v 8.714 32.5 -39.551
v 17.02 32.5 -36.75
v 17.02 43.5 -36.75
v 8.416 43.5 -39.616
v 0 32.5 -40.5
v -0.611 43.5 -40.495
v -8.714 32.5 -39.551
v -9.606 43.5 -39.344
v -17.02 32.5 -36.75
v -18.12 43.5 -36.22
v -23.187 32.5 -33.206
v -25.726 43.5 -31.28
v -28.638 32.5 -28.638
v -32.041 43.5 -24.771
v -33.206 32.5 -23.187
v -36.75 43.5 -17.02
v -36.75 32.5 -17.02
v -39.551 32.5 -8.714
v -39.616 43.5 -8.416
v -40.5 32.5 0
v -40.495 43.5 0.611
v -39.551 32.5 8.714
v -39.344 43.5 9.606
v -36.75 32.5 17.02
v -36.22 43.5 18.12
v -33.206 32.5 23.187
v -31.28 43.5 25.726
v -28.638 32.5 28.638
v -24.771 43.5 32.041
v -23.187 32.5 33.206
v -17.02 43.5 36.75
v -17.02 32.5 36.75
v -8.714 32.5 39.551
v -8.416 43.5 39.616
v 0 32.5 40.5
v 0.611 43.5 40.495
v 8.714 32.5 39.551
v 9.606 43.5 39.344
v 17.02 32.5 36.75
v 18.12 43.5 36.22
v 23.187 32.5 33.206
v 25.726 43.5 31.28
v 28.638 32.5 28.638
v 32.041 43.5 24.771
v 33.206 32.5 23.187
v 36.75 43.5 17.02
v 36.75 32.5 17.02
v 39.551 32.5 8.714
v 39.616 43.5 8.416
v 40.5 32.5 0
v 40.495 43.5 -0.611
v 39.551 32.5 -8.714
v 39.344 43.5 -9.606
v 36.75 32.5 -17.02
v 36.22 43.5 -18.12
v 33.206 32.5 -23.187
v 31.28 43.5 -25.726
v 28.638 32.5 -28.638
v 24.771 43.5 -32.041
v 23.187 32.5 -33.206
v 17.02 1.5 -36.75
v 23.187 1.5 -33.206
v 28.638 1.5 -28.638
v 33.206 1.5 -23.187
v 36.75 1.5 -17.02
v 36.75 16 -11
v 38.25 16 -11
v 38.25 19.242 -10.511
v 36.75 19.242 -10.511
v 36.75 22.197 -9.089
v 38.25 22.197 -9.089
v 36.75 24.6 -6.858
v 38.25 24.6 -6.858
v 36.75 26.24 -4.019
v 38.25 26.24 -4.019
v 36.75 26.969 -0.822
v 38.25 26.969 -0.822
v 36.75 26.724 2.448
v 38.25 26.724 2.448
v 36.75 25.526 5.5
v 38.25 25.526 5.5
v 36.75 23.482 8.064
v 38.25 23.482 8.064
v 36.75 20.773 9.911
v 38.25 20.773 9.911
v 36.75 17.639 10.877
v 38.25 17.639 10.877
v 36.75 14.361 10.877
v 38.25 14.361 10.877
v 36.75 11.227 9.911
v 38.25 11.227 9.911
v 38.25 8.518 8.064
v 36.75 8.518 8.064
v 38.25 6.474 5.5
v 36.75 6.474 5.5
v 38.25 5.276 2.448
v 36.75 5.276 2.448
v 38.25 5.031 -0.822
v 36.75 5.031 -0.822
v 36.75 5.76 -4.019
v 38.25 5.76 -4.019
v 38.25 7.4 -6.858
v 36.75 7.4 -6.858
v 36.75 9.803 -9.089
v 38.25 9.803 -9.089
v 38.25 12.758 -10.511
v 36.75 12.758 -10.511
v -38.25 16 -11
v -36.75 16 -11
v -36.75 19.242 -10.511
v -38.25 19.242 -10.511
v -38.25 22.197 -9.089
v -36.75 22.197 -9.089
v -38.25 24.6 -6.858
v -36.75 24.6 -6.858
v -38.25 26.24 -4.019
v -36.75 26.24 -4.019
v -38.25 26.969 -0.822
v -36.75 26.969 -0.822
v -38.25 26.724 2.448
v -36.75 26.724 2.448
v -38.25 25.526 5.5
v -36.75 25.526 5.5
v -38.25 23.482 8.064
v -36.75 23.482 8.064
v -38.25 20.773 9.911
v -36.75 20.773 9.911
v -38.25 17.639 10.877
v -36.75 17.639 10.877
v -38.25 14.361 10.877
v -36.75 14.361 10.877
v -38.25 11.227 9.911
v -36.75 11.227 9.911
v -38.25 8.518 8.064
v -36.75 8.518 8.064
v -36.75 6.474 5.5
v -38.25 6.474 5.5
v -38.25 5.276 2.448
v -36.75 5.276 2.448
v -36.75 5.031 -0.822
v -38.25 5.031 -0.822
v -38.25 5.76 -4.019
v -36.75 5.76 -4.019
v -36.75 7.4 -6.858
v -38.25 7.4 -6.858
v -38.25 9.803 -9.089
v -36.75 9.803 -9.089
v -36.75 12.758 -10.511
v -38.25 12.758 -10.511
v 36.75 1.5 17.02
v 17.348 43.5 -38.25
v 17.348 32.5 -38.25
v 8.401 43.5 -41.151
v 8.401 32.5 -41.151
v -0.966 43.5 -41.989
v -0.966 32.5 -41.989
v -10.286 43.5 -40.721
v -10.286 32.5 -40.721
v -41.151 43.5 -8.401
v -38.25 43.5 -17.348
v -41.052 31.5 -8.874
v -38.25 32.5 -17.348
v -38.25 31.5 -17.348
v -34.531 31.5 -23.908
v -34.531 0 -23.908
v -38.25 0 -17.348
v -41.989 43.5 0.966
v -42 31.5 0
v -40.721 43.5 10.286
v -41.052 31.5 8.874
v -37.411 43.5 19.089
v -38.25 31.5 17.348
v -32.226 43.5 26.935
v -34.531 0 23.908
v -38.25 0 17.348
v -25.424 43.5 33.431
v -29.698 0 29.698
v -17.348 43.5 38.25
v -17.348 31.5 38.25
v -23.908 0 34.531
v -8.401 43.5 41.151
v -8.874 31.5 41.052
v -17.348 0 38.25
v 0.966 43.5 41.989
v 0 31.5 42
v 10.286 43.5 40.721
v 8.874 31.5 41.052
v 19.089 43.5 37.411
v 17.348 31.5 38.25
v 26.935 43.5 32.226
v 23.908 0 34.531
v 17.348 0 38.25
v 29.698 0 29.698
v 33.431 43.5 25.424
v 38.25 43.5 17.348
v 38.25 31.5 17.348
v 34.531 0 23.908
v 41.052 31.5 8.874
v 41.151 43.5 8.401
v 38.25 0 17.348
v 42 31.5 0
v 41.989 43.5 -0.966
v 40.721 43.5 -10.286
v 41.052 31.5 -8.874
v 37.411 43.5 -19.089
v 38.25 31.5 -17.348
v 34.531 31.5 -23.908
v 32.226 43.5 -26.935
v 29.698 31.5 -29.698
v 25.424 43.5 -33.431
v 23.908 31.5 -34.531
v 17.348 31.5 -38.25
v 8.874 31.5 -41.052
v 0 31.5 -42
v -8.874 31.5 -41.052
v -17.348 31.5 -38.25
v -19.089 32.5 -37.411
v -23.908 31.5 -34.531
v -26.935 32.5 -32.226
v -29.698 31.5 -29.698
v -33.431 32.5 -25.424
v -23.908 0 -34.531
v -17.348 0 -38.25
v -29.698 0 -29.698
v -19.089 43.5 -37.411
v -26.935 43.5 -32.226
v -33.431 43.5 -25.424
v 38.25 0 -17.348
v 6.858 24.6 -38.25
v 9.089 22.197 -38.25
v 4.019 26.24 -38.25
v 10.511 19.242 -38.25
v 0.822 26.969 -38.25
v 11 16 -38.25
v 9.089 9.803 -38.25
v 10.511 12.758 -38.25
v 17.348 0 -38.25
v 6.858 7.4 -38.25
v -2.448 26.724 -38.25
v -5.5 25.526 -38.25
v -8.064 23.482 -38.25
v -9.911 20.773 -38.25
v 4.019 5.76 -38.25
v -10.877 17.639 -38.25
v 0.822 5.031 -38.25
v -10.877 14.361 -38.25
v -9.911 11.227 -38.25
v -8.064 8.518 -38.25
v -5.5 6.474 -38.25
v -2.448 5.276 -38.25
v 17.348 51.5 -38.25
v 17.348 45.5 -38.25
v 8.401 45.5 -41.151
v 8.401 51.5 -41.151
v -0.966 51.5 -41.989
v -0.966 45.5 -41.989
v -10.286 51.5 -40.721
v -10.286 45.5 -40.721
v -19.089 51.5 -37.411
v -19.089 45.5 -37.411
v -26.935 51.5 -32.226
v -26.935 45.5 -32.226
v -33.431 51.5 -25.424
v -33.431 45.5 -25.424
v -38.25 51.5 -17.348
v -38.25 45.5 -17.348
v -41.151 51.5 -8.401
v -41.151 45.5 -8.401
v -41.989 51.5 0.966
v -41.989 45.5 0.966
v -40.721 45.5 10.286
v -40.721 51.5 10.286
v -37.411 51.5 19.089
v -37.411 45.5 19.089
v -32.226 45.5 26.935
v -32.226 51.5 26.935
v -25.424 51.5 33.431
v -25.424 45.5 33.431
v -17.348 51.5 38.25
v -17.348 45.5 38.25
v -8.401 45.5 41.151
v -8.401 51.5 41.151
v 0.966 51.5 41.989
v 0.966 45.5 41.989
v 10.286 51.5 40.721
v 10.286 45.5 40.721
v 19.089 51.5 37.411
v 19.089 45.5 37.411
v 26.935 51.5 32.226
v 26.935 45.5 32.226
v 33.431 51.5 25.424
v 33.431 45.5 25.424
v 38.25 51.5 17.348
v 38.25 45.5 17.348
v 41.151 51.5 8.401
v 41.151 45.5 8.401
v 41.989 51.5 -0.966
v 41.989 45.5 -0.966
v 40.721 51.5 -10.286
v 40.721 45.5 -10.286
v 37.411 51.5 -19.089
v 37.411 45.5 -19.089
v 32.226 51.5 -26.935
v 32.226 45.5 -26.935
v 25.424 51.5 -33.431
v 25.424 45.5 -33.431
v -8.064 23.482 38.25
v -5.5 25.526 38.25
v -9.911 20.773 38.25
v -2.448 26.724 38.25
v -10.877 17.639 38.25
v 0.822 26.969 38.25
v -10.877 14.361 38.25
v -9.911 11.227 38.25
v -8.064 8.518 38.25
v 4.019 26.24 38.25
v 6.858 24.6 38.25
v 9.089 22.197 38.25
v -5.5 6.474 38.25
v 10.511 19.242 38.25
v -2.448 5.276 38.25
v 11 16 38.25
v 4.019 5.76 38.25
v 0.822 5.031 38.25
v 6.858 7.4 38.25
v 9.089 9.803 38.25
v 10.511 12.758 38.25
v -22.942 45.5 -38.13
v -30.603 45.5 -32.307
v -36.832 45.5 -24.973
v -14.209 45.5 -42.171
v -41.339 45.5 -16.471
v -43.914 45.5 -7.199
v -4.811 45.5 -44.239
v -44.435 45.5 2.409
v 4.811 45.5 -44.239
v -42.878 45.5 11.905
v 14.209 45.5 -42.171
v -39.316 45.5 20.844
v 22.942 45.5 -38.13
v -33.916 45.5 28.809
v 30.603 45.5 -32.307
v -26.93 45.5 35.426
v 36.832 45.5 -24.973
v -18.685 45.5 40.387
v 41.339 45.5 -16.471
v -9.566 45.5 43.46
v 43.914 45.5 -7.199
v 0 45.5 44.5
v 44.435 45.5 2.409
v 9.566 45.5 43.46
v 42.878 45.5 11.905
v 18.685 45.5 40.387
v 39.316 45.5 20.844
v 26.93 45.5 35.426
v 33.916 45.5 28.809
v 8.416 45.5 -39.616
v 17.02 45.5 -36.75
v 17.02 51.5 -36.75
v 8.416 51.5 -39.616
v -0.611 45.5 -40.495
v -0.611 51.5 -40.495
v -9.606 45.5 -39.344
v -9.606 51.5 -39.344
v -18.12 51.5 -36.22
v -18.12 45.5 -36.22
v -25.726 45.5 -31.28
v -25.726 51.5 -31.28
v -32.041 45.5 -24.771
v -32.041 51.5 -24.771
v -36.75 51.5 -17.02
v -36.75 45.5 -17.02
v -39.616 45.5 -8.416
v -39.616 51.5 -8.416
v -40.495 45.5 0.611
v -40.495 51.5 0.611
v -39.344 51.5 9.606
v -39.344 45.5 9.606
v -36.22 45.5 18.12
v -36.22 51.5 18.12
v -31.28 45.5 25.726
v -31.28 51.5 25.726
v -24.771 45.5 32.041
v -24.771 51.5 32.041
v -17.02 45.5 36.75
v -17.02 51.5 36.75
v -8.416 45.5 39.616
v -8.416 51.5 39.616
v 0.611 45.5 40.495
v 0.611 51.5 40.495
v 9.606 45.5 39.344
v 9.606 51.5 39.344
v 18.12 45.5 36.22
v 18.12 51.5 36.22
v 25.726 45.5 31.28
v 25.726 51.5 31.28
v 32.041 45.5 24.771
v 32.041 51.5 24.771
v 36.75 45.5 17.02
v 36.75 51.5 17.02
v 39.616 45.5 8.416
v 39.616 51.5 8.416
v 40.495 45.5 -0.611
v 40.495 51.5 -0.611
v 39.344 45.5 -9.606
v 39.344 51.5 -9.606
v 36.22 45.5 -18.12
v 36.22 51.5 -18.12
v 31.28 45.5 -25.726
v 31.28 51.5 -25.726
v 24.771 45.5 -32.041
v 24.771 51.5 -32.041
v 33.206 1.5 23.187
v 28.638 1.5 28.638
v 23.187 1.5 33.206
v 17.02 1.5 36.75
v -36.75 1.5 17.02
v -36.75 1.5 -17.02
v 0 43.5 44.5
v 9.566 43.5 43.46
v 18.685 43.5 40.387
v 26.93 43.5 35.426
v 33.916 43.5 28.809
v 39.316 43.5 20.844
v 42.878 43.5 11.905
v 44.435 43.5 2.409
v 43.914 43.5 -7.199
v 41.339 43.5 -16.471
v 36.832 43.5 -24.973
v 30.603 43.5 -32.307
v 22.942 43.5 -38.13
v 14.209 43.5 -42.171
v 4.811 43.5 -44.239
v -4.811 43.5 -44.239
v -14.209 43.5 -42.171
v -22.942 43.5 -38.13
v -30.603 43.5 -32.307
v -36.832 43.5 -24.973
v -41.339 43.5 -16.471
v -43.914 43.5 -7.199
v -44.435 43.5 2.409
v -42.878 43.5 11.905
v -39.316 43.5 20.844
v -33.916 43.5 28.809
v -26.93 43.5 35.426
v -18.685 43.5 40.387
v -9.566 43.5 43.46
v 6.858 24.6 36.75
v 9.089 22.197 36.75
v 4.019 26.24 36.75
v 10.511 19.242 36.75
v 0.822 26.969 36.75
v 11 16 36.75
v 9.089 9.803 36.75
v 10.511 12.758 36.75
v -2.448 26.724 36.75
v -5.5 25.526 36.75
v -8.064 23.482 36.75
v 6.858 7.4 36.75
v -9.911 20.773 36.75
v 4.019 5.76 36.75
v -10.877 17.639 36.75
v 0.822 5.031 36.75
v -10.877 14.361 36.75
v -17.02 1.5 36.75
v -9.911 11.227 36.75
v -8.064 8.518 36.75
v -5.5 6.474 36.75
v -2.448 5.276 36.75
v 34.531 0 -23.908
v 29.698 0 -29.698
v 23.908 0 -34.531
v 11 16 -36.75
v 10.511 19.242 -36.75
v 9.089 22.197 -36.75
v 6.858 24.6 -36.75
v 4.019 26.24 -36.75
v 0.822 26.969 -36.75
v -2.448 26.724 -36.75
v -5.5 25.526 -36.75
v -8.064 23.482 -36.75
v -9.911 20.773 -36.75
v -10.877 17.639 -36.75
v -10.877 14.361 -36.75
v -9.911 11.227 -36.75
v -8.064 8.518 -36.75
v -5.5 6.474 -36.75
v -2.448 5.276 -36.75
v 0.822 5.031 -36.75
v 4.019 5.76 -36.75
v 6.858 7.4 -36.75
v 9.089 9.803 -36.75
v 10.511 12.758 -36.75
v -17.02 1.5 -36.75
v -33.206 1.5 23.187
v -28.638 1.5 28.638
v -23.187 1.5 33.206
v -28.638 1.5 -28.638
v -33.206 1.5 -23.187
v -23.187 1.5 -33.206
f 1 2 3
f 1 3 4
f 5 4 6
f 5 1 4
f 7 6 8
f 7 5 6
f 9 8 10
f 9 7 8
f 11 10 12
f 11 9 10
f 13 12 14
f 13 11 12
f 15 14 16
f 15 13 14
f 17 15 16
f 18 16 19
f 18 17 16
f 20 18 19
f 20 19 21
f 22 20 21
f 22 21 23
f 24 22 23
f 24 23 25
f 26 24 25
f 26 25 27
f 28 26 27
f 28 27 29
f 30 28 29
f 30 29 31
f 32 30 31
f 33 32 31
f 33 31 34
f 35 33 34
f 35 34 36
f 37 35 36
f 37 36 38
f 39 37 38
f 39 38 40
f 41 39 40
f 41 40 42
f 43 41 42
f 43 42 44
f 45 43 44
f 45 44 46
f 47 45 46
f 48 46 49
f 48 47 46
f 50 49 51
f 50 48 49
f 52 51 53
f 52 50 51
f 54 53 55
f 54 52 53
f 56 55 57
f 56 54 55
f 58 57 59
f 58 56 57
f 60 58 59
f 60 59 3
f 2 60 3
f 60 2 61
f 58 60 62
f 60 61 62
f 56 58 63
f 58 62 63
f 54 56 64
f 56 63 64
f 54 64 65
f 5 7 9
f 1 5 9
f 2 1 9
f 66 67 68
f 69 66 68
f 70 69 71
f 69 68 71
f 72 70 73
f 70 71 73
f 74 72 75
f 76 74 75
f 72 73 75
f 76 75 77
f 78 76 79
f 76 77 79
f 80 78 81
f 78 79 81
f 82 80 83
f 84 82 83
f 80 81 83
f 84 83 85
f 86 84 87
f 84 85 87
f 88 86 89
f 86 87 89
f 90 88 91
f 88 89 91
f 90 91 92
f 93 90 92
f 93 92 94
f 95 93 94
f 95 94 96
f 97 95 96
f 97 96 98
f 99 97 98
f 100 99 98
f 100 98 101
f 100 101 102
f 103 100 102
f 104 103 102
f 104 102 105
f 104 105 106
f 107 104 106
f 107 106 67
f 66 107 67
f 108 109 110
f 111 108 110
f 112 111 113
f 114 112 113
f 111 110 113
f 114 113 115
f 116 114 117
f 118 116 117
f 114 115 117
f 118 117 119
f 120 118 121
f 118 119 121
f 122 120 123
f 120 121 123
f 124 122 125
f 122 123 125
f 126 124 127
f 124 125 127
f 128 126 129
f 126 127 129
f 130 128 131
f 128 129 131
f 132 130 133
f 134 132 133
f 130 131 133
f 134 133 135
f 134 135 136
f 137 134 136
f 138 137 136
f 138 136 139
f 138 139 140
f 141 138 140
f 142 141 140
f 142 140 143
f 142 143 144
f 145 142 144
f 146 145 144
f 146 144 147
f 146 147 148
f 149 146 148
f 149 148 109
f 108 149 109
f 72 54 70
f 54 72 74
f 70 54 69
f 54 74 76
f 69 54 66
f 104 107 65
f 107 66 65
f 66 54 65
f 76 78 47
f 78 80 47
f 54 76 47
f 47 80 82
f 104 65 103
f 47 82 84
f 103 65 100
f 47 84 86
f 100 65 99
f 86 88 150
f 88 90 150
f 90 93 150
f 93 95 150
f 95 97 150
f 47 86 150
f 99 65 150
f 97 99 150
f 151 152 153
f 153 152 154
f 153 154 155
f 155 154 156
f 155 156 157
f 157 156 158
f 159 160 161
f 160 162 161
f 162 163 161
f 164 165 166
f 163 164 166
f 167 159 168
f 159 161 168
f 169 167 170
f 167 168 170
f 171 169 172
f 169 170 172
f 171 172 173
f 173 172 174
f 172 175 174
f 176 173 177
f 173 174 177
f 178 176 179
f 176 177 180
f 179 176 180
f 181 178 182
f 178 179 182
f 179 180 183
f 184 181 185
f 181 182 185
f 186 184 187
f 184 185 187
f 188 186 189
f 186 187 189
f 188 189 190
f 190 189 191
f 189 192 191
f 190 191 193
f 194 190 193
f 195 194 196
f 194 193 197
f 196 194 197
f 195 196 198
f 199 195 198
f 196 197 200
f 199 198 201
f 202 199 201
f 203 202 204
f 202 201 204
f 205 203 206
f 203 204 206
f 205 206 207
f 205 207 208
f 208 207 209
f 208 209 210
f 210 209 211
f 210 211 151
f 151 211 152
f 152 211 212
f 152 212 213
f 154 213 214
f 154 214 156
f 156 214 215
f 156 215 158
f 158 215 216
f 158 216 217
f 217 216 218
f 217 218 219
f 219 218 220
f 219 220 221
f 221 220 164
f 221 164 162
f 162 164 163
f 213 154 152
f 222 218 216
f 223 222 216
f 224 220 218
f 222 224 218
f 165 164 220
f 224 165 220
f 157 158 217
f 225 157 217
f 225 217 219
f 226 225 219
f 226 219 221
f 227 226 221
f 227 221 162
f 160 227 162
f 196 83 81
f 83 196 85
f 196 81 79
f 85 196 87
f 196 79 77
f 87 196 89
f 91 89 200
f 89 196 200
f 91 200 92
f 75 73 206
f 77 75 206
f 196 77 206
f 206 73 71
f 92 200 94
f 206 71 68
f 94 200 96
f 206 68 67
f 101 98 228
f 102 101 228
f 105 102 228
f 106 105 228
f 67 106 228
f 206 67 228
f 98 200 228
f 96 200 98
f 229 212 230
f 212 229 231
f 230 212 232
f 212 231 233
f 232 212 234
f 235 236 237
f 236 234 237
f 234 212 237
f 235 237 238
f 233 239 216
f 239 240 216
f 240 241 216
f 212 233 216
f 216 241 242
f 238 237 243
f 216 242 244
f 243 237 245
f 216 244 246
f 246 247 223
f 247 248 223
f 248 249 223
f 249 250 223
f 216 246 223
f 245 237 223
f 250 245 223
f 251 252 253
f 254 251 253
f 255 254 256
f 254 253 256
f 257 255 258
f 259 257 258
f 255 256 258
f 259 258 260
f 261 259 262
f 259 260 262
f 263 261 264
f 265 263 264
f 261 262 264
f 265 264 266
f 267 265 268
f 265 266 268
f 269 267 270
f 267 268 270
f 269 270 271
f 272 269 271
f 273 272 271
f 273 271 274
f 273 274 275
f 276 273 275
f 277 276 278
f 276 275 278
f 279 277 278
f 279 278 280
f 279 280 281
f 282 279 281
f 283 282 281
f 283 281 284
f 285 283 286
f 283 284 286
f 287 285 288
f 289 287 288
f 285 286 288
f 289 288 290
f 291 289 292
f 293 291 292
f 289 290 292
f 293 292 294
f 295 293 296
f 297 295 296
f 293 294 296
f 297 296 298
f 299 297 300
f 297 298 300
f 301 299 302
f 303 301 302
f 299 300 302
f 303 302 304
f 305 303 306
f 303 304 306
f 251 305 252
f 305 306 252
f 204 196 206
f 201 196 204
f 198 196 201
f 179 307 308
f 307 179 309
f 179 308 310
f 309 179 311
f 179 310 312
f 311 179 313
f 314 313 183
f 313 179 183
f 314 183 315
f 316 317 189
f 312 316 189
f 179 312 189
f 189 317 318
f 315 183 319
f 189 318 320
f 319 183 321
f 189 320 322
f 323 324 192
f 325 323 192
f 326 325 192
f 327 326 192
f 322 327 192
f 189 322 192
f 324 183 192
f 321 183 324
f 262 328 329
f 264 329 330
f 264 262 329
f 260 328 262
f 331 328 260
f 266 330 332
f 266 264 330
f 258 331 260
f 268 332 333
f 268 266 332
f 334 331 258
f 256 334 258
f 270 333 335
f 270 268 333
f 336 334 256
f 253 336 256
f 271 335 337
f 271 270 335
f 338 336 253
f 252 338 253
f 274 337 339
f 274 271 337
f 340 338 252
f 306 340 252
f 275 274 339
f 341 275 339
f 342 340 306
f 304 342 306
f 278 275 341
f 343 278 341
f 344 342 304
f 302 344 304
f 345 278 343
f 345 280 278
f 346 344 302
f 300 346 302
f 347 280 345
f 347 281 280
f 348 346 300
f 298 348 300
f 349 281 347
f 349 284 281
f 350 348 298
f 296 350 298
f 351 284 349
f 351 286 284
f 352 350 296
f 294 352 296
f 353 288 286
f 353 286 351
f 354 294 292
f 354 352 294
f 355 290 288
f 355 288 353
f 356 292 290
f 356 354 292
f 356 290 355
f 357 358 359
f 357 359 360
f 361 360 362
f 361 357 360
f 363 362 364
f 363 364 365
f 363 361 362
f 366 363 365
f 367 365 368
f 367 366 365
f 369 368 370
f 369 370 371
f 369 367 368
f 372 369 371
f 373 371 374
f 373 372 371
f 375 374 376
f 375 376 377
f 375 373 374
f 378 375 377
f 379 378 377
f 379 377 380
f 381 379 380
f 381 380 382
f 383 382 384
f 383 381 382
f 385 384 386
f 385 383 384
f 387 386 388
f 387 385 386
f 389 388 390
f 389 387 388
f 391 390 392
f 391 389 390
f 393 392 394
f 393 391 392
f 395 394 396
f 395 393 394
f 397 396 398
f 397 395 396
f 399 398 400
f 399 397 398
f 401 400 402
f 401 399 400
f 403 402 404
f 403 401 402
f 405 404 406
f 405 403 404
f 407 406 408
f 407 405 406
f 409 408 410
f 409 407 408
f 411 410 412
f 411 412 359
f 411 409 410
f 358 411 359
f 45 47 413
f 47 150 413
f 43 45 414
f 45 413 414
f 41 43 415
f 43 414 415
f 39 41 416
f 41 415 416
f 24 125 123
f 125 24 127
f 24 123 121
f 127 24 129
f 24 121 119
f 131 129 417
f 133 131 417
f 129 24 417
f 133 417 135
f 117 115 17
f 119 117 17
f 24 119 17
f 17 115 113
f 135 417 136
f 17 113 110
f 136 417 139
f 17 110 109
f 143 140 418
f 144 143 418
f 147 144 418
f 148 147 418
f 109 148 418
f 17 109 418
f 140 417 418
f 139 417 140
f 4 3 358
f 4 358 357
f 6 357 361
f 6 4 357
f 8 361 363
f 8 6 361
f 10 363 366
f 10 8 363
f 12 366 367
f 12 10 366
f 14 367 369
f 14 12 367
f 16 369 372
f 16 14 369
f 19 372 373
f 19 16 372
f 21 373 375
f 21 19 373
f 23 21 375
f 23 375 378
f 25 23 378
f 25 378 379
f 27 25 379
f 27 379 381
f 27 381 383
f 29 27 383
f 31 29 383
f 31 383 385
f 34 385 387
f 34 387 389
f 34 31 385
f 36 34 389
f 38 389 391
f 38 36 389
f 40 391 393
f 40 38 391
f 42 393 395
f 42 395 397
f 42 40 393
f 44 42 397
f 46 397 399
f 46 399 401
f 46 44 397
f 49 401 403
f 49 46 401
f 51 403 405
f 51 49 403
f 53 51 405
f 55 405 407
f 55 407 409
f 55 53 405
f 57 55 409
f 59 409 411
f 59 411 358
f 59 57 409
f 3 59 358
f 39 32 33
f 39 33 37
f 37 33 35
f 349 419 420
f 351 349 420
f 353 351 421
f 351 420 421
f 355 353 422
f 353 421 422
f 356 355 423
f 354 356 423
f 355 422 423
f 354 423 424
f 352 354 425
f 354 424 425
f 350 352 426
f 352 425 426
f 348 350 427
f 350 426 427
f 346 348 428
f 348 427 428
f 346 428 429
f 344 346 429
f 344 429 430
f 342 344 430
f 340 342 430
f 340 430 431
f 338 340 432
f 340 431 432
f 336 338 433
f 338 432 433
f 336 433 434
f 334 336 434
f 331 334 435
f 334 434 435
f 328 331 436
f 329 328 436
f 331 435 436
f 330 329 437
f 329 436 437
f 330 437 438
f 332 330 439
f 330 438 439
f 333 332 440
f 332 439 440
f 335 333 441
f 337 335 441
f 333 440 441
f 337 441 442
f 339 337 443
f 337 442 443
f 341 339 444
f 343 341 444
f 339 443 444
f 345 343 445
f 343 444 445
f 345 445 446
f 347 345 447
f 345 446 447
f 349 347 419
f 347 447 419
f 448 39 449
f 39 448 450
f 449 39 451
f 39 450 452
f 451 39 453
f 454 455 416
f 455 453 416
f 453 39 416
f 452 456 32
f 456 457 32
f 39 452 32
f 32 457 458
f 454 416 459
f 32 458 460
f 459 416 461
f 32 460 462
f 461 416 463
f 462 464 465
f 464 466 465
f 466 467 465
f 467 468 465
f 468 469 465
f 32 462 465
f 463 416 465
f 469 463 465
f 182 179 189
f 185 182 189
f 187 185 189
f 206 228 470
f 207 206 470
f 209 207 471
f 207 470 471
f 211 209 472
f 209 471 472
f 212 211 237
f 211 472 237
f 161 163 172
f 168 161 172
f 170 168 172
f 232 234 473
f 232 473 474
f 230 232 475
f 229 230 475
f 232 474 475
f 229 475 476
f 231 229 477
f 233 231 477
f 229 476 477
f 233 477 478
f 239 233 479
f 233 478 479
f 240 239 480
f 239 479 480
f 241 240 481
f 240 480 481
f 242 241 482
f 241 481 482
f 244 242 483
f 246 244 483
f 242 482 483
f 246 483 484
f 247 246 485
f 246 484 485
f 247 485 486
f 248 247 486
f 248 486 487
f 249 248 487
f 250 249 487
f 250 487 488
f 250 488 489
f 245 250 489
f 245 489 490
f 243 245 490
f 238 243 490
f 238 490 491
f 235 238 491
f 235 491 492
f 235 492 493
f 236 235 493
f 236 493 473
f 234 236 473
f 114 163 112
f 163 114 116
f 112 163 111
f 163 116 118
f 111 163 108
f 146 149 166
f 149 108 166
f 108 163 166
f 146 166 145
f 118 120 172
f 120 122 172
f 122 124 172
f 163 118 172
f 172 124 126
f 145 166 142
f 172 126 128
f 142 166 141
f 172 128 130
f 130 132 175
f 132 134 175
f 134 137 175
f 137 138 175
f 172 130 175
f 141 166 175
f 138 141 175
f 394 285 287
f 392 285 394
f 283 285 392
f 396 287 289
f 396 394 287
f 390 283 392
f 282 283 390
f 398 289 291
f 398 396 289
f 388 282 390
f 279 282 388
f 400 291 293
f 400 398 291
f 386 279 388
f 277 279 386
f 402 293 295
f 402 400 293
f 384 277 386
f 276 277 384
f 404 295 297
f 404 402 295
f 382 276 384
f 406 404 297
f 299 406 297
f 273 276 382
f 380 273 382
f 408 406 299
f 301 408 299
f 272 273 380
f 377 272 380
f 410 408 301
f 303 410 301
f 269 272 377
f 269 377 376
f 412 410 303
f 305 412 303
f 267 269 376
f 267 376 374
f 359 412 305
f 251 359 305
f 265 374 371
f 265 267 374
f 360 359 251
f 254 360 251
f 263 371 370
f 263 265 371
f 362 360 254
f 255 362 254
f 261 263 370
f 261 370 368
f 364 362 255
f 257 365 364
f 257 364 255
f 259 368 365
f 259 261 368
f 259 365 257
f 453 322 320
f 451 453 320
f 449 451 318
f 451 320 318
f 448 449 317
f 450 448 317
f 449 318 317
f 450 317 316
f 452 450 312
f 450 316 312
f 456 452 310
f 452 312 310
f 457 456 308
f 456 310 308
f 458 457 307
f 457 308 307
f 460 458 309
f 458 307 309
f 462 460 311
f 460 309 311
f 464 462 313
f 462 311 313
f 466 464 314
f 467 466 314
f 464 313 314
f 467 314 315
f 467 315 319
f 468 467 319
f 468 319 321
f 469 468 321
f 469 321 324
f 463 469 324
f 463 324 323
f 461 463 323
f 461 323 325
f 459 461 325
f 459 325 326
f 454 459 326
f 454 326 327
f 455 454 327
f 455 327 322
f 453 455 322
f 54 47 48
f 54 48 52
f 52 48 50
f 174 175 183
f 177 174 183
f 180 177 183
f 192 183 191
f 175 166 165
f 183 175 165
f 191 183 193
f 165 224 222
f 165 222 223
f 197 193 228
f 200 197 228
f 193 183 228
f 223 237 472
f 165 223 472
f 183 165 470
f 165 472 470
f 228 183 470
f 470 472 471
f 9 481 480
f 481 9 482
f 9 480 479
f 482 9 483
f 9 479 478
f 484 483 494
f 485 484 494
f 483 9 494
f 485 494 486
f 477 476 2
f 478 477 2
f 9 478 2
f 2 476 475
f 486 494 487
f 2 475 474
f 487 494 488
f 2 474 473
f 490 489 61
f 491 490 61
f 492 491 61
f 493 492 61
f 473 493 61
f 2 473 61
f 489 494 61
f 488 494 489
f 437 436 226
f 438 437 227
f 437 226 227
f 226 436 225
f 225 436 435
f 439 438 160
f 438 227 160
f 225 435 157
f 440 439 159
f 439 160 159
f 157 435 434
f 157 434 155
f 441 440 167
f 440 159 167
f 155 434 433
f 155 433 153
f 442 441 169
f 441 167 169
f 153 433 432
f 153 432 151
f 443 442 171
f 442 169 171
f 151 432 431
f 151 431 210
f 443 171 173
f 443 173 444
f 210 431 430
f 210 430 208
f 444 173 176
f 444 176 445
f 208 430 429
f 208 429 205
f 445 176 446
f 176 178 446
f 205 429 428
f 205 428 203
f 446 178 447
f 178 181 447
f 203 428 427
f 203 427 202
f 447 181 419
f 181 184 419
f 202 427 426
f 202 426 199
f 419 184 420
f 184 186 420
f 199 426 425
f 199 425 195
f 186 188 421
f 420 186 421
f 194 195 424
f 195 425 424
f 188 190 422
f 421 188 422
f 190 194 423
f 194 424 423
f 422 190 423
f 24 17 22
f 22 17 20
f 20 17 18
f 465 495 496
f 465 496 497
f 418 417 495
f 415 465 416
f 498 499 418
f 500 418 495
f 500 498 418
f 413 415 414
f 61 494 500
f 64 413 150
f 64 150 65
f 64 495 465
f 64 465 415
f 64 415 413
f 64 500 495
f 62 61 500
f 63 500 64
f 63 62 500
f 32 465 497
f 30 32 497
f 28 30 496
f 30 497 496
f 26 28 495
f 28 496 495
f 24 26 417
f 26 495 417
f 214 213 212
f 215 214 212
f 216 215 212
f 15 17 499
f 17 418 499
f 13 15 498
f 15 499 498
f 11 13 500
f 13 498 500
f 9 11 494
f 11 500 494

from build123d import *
from build123d.topology import SkipClean

# Parameters (mm, degrees)
EXTRUDE_1_DEPTH          = 1.5
EXTRUDE_2_DEPTH          = 30
EXTRUDE_3_DEPTH          = 1
SKETCH_4_R               = 42
SKETCH_4_R_2             = 40.5
EXTRUDE_4_DEPTH          = 11
SKETCH_5_R               = 44.50000000000001
SKETCH_5_R_2             = 40.5
EXTRUDE_5_DEPTH          = 2
SKETCH_6_R               = 42
SKETCH_6_R_2             = 40.5
EXTRUDE_6_DEPTH          = 6
SKETCH_7_R               = 11
CUT_EXTRUDE_1_DEPTH      = 108.14505354891564
PATTERN_CIRCULAR_1_COUNT = 2
PATTERN_CIRCULAR_1_ANGLE = 90.0000000000002


with BuildPart() as part:
    # Эскиз1 → Бобышка-Вытянуть1 (new body)
    with BuildSketch(Plane(origin=(0, 0, 0), x_dir=(1, 0, 0), z_dir=(0, 1, 0))):
        with BuildLine():
            Line((17.347550259331598, 38.25), (-17.347550259330436, 38.25))
            ThreePointArc((-17.347550259330443, 38.25000000000006), (-29.698484809834387, 29.698484809835605), (-38.24999999999934, 17.34755025933202))
            Line((-38.25, 17.34755025933216), (-38.25, -17.34755025933218))
            ThreePointArc((-38.249999999999325, -17.347550259332046), (-29.698484809834383, -29.698484809835612), (-17.34755025933046, -38.25000000000004))
            Line((-17.347550259330426, -38.25), (17.34755025933157, -38.25))
            ThreePointArc((17.347550259331467, -38.249999999999595), (29.69848480983491, -29.698484809835083), (38.24999999999949, -17.347550259331687))
            Line((38.25, -17.34755025933179), (38.25, 17.347550259331754))
            ThreePointArc((38.2499999999995, 17.347550259331655), (29.69848480983494, 29.69848480983505), (17.347550259331513, 38.249999999999574))
        make_face()
    extrude(amount=EXTRUDE_1_DEPTH)

    # Эскиз2 → Бобышка-Вытянуть2 (add)
    with BuildSketch(Plane(origin=(0, 1.5, 0), x_dir=(1, 0, 0), z_dir=(0, 1, 0))):
        with BuildLine():
            Line((-17.34755025933057, -38.25), (17.34755025933057, -38.25))
            ThreePointArc((17.34755025933057, -38.25), (29.698484809834998, -29.698484809834994), (38.25, -17.347550259330568))
            Line((38.25, -17.347550259330568), (38.25, 17.34755025933057))
            ThreePointArc((38.25, 17.34755025933057), (29.698484809834998, 29.698484809834994), (17.347550259330568, 38.25))
            Line((17.347550259330568, 38.25), (-17.34755025933057, 38.25))
            ThreePointArc((-17.34755025933057, 38.25), (-29.698484809834994, 29.698484809834998), (-38.25, 17.347550259330582))
            Line((-38.25, 17.347550259330582), (-38.25, -17.34755025933057))
            ThreePointArc((-38.25, -17.34755025933057), (-29.698484809834994, -29.698484809834998), (-17.34755025933057, -38.25))
        make_face()
        with BuildLine():
            Line((-17.020208576865333, -36.75), (17.020208576865333, -36.75))
            ThreePointArc((17.020208576865333, -36.75), (28.637824638055175, -28.63782463805517), (36.75, -17.020208576865333))
            Line((36.75, -17.020208576865333), (36.75, 17.020208576865333))
            ThreePointArc((36.75, 17.020208576865333), (28.637824638055175, 28.63782463805517), (17.020208576865333, 36.75))
            Line((17.020208576865333, 36.75), (-17.020208576865333, 36.75))
            ThreePointArc((-17.020208576865333, 36.75), (-28.63782463805517, 28.637824638055175), (-36.75, 17.020208576865333))
            Line((-36.75, 17.020208576865333), (-36.75, -17.020208576865333))
            ThreePointArc((-36.75, -17.020208576865333), (-28.63782463805517, -28.637824638055175), (-17.020208576865333, -36.75))
        make_face(mode=Mode.SUBTRACT)
    extrude(amount=EXTRUDE_2_DEPTH)

    # Эскиз3 → Бобышка-Вытянуть3 (add)
    with BuildSketch(Plane(origin=(0, 31.5, 0), x_dir=(1, 0, 0), z_dir=(0, 1, 0))):
        with BuildLine():
            Line((-38.25, -13.31117951197428), (-38.249999999999986, 13.311179511974292))
            ThreePointArc((-38.24999999999994, 13.311179511974292), (-40.5, 4.96e-15), (-38.24999999999996, -13.311179511974263))
        make_face()
        with BuildLine():
            ThreePointArc((-36.74999999999999, 17.02020857686534), (-37.545828318883174, 15.184227864759881), (-38.24999999999994, 13.311179511974292))
            Line((-38.249999999999986, 13.311179511974292), (-38.25, -13.31117951197428))
            ThreePointArc((-38.24999999999996, -13.311179511974263), (-37.54582831888318, -15.184227864759869), (-36.75, -17.02020857686533))
            Line((-36.75, -17.020208576865333), (-36.75, 17.02020857686534))
        make_face()
        with BuildLine():
            ThreePointArc((38.25, -17.347550259330568), (41.05179655021202, -8.874119674649448), (42, -1.029e-14))
            ThreePointArc((42, 0), (41.051796550212025, 8.874119674649428), (38.24999999999999, 17.347550259330575))
            Line((38.25, 17.347550259330568), (38.25, 13.311179511973094))
            ThreePointArc((38.25000000000035, 13.311179511973151), (39.933538535922494, 6.749999999999486), (40.5, 0))
            ThreePointArc((40.5, -9.92e-15), (39.933538535922494, -6.749999999999494), (38.25000000000033, -13.311179511973192))
            Line((38.25, -13.311179511973124), (38.25, -17.347550259330568))
        make_face()
        with BuildLine():
            ThreePointArc((40.5, 0), (39.933538535922494, 6.749999999999486), (38.25000000000035, 13.311179511973151))
            Line((38.25, 13.311179511973094), (38.25, -13.311179511973124))
            ThreePointArc((38.25000000000033, -13.311179511973192), (39.933538535922494, -6.749999999999494), (40.5, -9.92e-15))
        make_face()
        with BuildLine():
            Line((38.25, -13.311179511973124), (38.25, 13.311179511973094))
            ThreePointArc((38.25000000000035, 13.311179511973151), (37.5458283188834, 15.184227864759325), (36.75, 17.020208576865333))
            Line((36.75, 17.020208576865333), (36.75, -17.020208576865333))
            ThreePointArc((36.74999999999999, -17.020208576865343), (37.54582831888339, -15.18422786475935), (38.25000000000033, -13.311179511973192))
        make_face()
        with BuildLine():
            ThreePointArc((17.02020857686533, 36.75), (15.18422786475986, 37.54582831888318), (13.311179511974236, 38.249999999999964))
            Line((13.311179511974245, 38.25000000000001), (-13.311179511974242, 38.25))
            ThreePointArc((-13.311179511974233, 38.249999999999964), (-15.184227864759857, 37.54582831888318), (-17.020208576865333, 36.75))
            Line((-17.020208576865333, 36.75), (17.020208576865326, 36.75000000000001))
        make_face()
        with BuildLine():
            Line((-13.311179511974242, 38.25), (13.311179511974245, 38.25000000000001))
            ThreePointArc((13.311179511974236, 38.249999999999964), (2.48e-15, 40.5), (-13.311179511974233, 38.249999999999964))
        make_face()
        with BuildLine():
            Line((13.311179511974245, 38.25000000000001), (17.347550259330564, 38.25000000000001))
            ThreePointArc((17.34755025933056, 38.25000000000001), (-6.75e-15, 42), (-17.34755025933057, 38.25))
            Line((-17.34755025933057, 38.25), (-13.311179511974242, 38.25))
            ThreePointArc((-13.311179511974233, 38.249999999999964), (2.48e-15, 40.5), (13.311179511974236, 38.249999999999964))
        make_face()
        with BuildLine():
            ThreePointArc((-17.347550259330596, -38.249999999999986), (-7.72e-15, -42), (17.347550259330582, -38.24999999999999))
            Line((17.34755025933057, -38.25), (13.311179511974295, -38.25))
            ThreePointArc((13.311179511974295, -38.24999999999994), (2.853e-14, -40.5), (-13.311179511974242, -38.249999999999964))
            Line((-13.311179511974242, -38.25), (-17.34755025933057, -38.25))
        make_face()
        with BuildLine():
            ThreePointArc((-13.311179511974242, -38.249999999999964), (2.853e-14, -40.5), (13.311179511974295, -38.24999999999994))
            Line((13.311179511974295, -38.25), (-13.311179511974242, -38.25))
        make_face()
        with BuildLine():
            Line((-13.311179511974242, -38.25), (13.311179511974295, -38.25))
            ThreePointArc((13.311179511974295, -38.24999999999994), (15.184227864759867, -37.54582831888318), (17.02020857686533, -36.75))
            Line((17.020208576865333, -36.75), (-17.020208576865333, -36.75))
            ThreePointArc((-17.020208576865343, -36.74999999999999), (-15.18422786475985, -37.54582831888319), (-13.311179511974242, -38.249999999999964))
        make_face()
        with BuildLine():
            ThreePointArc((-38.25, -17.347550259330568), (-29.698484809835, -29.698484809834994), (-17.347550259330596, -38.249999999999986))
            Line((-17.34755025933057, -38.25), (-13.311179511974242, -38.25))
            ThreePointArc((-13.311179511974242, -38.249999999999964), (-15.18422786475985, -37.54582831888319), (-17.020208576865343, -36.74999999999999))
            ThreePointArc((-17.020208576865343, -36.74999999999999), (-28.637824638055182, -28.63782463805517), (-36.75, -17.02020857686533))
            ThreePointArc((-36.75, -17.02020857686533), (-37.54582831888318, -15.184227864759869), (-38.24999999999996, -13.311179511974263))
            Line((-38.25, -13.31117951197428), (-38.25, -17.34755025933057))
        make_face()
        with BuildLine():
            ThreePointArc((17.347550259330582, -38.24999999999999), (29.698484809835016, -29.698484809834973), (38.25, -17.347550259330568))
            Line((38.25, -17.347550259330568), (38.25, -13.311179511973124))
            ThreePointArc((38.25000000000033, -13.311179511973192), (37.54582831888339, -15.18422786475935), (36.74999999999999, -17.020208576865343))
            ThreePointArc((36.74999999999999, -17.020208576865343), (28.637824638055168, -28.637824638055182), (17.02020857686533, -36.75))
            ThreePointArc((17.02020857686533, -36.75), (15.184227864759867, -37.54582831888318), (13.311179511974295, -38.24999999999994))
            Line((13.311179511974295, -38.25), (17.34755025933057, -38.25))
        make_face()
        with BuildLine():
            Line((38.25, 13.311179511973094), (38.25, 17.347550259330568))
            ThreePointArc((38.24999999999999, 17.347550259330575), (29.698484809834987, 29.698484809835), (17.34755025933056, 38.25000000000001))
            Line((17.347550259330564, 38.25000000000001), (13.311179511974245, 38.25000000000001))
            ThreePointArc((13.311179511974236, 38.249999999999964), (15.18422786475986, 37.54582831888318), (17.02020857686533, 36.75))
            ThreePointArc((17.02020857686533, 36.75), (28.637824638055175, 28.63782463805517), (36.75, 17.020208576865333))
            ThreePointArc((36.75, 17.020208576865333), (37.5458283188834, 15.184227864759325), (38.25000000000035, 13.311179511973151))
        make_face()
        with BuildLine():
            Line((-13.311179511974242, 38.25), (-17.34755025933057, 38.25))
            ThreePointArc((-17.34755025933057, 38.25), (-29.69848480983498, 29.698484809835012), (-38.24999999999998, 17.347550259330614))
            Line((-38.249999999999986, 17.3475502593306), (-38.249999999999986, 13.311179511974292))
            ThreePointArc((-38.24999999999994, 13.311179511974292), (-37.545828318883174, 15.184227864759881), (-36.74999999999999, 17.02020857686534))
            ThreePointArc((-36.74999999999999, 17.02020857686534), (-28.63782463805517, 28.637824638055175), (-17.020208576865333, 36.75))
            ThreePointArc((-17.020208576865333, 36.75), (-15.184227864759857, 37.54582831888318), (-13.311179511974233, 38.249999999999964))
        make_face()
        with BuildLine():
            Line((-38.249999999999986, 13.311179511974292), (-38.249999999999986, 17.3475502593306))
            ThreePointArc((-38.24999999999998, 17.347550259330614), (-42, 2.38e-14), (-38.25, -17.347550259330568))
            Line((-38.25, -17.34755025933057), (-38.25, -13.31117951197428))
            ThreePointArc((-38.24999999999996, -13.311179511974263), (-40.5, 4.96e-15), (-38.24999999999994, 13.311179511974292))
        make_face()
    extrude(amount=EXTRUDE_3_DEPTH)

    # Эскиз4 → Бобышка-Вытянуть4 (add)
    with SkipClean():  # the faces are left unmerged after this step: merging them gives an invalid solid
        with BuildSketch(Plane(origin=(0, 32.5, 0), x_dir=(1, 0, 0), z_dir=(0, 1, 0))):
            with Locations(Location((0, 0, 0), (0, 0, 65.604247888))):
                Circle(SKETCH_4_R)
            with Locations(Location((0, 0, 0), (0, 0, 65.14949766))):
                Circle(SKETCH_4_R_2, mode=Mode.SUBTRACT)
        extrude(amount=EXTRUDE_4_DEPTH)

    # Эскиз5 → Бобышка-Вытянуть5 (add)
    with BuildSketch(Plane(origin=(0, 43.5, 0), x_dir=(1, 0, 0), z_dir=(0, 1, 0))):
        with Locations(Location((0, 0, 0), (0, 0, 270))):
            Circle(SKETCH_5_R)
        with Locations(Location((0, 0, 0), (0, 0, 65.14949766))):
            Circle(SKETCH_5_R_2, mode=Mode.SUBTRACT)
    extrude(amount=EXTRUDE_5_DEPTH)

    # Эскиз6 → Бобышка-Вытянуть6 (add)
    with BuildSketch(Plane(origin=(0, 45.5, 0), x_dir=(1, 0, 0), z_dir=(0, 1, 0))):
        with Locations(Location((0, 0, 0), (0, 0, 65.604247888))):
            Circle(SKETCH_6_R)
        with Locations(Location((0, 0, 0), (0, 0, 65.14949766))):
            Circle(SKETCH_6_R_2, mode=Mode.SUBTRACT)
    extrude(amount=EXTRUDE_6_DEPTH)

    # Эскиз7 → Вырез-Вытянуть1 (cut, through all)
    with BuildSketch(Plane(origin=(38.25, 0, 0), x_dir=(0, 0, -1), z_dir=(1, 0, 0))):
        with Locations((0, 16)):
            Circle(SKETCH_7_R)
    cut_extrude_1 = extrude(amount=-CUT_EXTRUDE_1_DEPTH, mode=Mode.SUBTRACT)

    # Круговой массив1: Вырез-Вытянуть1 ×2 about axis
    pattern_circular_1_axis = Axis((0, 0, 0), (0, -1, 0))
    for i in range(1, PATTERN_CIRCULAR_1_COUNT):
        add(cut_extrude_1.rotate(pattern_circular_1_axis, i * PATTERN_CIRCULAR_1_ANGLE / (PATTERN_CIRCULAR_1_COUNT - 1)), mode=Mode.SUBTRACT)


solid = part.part
